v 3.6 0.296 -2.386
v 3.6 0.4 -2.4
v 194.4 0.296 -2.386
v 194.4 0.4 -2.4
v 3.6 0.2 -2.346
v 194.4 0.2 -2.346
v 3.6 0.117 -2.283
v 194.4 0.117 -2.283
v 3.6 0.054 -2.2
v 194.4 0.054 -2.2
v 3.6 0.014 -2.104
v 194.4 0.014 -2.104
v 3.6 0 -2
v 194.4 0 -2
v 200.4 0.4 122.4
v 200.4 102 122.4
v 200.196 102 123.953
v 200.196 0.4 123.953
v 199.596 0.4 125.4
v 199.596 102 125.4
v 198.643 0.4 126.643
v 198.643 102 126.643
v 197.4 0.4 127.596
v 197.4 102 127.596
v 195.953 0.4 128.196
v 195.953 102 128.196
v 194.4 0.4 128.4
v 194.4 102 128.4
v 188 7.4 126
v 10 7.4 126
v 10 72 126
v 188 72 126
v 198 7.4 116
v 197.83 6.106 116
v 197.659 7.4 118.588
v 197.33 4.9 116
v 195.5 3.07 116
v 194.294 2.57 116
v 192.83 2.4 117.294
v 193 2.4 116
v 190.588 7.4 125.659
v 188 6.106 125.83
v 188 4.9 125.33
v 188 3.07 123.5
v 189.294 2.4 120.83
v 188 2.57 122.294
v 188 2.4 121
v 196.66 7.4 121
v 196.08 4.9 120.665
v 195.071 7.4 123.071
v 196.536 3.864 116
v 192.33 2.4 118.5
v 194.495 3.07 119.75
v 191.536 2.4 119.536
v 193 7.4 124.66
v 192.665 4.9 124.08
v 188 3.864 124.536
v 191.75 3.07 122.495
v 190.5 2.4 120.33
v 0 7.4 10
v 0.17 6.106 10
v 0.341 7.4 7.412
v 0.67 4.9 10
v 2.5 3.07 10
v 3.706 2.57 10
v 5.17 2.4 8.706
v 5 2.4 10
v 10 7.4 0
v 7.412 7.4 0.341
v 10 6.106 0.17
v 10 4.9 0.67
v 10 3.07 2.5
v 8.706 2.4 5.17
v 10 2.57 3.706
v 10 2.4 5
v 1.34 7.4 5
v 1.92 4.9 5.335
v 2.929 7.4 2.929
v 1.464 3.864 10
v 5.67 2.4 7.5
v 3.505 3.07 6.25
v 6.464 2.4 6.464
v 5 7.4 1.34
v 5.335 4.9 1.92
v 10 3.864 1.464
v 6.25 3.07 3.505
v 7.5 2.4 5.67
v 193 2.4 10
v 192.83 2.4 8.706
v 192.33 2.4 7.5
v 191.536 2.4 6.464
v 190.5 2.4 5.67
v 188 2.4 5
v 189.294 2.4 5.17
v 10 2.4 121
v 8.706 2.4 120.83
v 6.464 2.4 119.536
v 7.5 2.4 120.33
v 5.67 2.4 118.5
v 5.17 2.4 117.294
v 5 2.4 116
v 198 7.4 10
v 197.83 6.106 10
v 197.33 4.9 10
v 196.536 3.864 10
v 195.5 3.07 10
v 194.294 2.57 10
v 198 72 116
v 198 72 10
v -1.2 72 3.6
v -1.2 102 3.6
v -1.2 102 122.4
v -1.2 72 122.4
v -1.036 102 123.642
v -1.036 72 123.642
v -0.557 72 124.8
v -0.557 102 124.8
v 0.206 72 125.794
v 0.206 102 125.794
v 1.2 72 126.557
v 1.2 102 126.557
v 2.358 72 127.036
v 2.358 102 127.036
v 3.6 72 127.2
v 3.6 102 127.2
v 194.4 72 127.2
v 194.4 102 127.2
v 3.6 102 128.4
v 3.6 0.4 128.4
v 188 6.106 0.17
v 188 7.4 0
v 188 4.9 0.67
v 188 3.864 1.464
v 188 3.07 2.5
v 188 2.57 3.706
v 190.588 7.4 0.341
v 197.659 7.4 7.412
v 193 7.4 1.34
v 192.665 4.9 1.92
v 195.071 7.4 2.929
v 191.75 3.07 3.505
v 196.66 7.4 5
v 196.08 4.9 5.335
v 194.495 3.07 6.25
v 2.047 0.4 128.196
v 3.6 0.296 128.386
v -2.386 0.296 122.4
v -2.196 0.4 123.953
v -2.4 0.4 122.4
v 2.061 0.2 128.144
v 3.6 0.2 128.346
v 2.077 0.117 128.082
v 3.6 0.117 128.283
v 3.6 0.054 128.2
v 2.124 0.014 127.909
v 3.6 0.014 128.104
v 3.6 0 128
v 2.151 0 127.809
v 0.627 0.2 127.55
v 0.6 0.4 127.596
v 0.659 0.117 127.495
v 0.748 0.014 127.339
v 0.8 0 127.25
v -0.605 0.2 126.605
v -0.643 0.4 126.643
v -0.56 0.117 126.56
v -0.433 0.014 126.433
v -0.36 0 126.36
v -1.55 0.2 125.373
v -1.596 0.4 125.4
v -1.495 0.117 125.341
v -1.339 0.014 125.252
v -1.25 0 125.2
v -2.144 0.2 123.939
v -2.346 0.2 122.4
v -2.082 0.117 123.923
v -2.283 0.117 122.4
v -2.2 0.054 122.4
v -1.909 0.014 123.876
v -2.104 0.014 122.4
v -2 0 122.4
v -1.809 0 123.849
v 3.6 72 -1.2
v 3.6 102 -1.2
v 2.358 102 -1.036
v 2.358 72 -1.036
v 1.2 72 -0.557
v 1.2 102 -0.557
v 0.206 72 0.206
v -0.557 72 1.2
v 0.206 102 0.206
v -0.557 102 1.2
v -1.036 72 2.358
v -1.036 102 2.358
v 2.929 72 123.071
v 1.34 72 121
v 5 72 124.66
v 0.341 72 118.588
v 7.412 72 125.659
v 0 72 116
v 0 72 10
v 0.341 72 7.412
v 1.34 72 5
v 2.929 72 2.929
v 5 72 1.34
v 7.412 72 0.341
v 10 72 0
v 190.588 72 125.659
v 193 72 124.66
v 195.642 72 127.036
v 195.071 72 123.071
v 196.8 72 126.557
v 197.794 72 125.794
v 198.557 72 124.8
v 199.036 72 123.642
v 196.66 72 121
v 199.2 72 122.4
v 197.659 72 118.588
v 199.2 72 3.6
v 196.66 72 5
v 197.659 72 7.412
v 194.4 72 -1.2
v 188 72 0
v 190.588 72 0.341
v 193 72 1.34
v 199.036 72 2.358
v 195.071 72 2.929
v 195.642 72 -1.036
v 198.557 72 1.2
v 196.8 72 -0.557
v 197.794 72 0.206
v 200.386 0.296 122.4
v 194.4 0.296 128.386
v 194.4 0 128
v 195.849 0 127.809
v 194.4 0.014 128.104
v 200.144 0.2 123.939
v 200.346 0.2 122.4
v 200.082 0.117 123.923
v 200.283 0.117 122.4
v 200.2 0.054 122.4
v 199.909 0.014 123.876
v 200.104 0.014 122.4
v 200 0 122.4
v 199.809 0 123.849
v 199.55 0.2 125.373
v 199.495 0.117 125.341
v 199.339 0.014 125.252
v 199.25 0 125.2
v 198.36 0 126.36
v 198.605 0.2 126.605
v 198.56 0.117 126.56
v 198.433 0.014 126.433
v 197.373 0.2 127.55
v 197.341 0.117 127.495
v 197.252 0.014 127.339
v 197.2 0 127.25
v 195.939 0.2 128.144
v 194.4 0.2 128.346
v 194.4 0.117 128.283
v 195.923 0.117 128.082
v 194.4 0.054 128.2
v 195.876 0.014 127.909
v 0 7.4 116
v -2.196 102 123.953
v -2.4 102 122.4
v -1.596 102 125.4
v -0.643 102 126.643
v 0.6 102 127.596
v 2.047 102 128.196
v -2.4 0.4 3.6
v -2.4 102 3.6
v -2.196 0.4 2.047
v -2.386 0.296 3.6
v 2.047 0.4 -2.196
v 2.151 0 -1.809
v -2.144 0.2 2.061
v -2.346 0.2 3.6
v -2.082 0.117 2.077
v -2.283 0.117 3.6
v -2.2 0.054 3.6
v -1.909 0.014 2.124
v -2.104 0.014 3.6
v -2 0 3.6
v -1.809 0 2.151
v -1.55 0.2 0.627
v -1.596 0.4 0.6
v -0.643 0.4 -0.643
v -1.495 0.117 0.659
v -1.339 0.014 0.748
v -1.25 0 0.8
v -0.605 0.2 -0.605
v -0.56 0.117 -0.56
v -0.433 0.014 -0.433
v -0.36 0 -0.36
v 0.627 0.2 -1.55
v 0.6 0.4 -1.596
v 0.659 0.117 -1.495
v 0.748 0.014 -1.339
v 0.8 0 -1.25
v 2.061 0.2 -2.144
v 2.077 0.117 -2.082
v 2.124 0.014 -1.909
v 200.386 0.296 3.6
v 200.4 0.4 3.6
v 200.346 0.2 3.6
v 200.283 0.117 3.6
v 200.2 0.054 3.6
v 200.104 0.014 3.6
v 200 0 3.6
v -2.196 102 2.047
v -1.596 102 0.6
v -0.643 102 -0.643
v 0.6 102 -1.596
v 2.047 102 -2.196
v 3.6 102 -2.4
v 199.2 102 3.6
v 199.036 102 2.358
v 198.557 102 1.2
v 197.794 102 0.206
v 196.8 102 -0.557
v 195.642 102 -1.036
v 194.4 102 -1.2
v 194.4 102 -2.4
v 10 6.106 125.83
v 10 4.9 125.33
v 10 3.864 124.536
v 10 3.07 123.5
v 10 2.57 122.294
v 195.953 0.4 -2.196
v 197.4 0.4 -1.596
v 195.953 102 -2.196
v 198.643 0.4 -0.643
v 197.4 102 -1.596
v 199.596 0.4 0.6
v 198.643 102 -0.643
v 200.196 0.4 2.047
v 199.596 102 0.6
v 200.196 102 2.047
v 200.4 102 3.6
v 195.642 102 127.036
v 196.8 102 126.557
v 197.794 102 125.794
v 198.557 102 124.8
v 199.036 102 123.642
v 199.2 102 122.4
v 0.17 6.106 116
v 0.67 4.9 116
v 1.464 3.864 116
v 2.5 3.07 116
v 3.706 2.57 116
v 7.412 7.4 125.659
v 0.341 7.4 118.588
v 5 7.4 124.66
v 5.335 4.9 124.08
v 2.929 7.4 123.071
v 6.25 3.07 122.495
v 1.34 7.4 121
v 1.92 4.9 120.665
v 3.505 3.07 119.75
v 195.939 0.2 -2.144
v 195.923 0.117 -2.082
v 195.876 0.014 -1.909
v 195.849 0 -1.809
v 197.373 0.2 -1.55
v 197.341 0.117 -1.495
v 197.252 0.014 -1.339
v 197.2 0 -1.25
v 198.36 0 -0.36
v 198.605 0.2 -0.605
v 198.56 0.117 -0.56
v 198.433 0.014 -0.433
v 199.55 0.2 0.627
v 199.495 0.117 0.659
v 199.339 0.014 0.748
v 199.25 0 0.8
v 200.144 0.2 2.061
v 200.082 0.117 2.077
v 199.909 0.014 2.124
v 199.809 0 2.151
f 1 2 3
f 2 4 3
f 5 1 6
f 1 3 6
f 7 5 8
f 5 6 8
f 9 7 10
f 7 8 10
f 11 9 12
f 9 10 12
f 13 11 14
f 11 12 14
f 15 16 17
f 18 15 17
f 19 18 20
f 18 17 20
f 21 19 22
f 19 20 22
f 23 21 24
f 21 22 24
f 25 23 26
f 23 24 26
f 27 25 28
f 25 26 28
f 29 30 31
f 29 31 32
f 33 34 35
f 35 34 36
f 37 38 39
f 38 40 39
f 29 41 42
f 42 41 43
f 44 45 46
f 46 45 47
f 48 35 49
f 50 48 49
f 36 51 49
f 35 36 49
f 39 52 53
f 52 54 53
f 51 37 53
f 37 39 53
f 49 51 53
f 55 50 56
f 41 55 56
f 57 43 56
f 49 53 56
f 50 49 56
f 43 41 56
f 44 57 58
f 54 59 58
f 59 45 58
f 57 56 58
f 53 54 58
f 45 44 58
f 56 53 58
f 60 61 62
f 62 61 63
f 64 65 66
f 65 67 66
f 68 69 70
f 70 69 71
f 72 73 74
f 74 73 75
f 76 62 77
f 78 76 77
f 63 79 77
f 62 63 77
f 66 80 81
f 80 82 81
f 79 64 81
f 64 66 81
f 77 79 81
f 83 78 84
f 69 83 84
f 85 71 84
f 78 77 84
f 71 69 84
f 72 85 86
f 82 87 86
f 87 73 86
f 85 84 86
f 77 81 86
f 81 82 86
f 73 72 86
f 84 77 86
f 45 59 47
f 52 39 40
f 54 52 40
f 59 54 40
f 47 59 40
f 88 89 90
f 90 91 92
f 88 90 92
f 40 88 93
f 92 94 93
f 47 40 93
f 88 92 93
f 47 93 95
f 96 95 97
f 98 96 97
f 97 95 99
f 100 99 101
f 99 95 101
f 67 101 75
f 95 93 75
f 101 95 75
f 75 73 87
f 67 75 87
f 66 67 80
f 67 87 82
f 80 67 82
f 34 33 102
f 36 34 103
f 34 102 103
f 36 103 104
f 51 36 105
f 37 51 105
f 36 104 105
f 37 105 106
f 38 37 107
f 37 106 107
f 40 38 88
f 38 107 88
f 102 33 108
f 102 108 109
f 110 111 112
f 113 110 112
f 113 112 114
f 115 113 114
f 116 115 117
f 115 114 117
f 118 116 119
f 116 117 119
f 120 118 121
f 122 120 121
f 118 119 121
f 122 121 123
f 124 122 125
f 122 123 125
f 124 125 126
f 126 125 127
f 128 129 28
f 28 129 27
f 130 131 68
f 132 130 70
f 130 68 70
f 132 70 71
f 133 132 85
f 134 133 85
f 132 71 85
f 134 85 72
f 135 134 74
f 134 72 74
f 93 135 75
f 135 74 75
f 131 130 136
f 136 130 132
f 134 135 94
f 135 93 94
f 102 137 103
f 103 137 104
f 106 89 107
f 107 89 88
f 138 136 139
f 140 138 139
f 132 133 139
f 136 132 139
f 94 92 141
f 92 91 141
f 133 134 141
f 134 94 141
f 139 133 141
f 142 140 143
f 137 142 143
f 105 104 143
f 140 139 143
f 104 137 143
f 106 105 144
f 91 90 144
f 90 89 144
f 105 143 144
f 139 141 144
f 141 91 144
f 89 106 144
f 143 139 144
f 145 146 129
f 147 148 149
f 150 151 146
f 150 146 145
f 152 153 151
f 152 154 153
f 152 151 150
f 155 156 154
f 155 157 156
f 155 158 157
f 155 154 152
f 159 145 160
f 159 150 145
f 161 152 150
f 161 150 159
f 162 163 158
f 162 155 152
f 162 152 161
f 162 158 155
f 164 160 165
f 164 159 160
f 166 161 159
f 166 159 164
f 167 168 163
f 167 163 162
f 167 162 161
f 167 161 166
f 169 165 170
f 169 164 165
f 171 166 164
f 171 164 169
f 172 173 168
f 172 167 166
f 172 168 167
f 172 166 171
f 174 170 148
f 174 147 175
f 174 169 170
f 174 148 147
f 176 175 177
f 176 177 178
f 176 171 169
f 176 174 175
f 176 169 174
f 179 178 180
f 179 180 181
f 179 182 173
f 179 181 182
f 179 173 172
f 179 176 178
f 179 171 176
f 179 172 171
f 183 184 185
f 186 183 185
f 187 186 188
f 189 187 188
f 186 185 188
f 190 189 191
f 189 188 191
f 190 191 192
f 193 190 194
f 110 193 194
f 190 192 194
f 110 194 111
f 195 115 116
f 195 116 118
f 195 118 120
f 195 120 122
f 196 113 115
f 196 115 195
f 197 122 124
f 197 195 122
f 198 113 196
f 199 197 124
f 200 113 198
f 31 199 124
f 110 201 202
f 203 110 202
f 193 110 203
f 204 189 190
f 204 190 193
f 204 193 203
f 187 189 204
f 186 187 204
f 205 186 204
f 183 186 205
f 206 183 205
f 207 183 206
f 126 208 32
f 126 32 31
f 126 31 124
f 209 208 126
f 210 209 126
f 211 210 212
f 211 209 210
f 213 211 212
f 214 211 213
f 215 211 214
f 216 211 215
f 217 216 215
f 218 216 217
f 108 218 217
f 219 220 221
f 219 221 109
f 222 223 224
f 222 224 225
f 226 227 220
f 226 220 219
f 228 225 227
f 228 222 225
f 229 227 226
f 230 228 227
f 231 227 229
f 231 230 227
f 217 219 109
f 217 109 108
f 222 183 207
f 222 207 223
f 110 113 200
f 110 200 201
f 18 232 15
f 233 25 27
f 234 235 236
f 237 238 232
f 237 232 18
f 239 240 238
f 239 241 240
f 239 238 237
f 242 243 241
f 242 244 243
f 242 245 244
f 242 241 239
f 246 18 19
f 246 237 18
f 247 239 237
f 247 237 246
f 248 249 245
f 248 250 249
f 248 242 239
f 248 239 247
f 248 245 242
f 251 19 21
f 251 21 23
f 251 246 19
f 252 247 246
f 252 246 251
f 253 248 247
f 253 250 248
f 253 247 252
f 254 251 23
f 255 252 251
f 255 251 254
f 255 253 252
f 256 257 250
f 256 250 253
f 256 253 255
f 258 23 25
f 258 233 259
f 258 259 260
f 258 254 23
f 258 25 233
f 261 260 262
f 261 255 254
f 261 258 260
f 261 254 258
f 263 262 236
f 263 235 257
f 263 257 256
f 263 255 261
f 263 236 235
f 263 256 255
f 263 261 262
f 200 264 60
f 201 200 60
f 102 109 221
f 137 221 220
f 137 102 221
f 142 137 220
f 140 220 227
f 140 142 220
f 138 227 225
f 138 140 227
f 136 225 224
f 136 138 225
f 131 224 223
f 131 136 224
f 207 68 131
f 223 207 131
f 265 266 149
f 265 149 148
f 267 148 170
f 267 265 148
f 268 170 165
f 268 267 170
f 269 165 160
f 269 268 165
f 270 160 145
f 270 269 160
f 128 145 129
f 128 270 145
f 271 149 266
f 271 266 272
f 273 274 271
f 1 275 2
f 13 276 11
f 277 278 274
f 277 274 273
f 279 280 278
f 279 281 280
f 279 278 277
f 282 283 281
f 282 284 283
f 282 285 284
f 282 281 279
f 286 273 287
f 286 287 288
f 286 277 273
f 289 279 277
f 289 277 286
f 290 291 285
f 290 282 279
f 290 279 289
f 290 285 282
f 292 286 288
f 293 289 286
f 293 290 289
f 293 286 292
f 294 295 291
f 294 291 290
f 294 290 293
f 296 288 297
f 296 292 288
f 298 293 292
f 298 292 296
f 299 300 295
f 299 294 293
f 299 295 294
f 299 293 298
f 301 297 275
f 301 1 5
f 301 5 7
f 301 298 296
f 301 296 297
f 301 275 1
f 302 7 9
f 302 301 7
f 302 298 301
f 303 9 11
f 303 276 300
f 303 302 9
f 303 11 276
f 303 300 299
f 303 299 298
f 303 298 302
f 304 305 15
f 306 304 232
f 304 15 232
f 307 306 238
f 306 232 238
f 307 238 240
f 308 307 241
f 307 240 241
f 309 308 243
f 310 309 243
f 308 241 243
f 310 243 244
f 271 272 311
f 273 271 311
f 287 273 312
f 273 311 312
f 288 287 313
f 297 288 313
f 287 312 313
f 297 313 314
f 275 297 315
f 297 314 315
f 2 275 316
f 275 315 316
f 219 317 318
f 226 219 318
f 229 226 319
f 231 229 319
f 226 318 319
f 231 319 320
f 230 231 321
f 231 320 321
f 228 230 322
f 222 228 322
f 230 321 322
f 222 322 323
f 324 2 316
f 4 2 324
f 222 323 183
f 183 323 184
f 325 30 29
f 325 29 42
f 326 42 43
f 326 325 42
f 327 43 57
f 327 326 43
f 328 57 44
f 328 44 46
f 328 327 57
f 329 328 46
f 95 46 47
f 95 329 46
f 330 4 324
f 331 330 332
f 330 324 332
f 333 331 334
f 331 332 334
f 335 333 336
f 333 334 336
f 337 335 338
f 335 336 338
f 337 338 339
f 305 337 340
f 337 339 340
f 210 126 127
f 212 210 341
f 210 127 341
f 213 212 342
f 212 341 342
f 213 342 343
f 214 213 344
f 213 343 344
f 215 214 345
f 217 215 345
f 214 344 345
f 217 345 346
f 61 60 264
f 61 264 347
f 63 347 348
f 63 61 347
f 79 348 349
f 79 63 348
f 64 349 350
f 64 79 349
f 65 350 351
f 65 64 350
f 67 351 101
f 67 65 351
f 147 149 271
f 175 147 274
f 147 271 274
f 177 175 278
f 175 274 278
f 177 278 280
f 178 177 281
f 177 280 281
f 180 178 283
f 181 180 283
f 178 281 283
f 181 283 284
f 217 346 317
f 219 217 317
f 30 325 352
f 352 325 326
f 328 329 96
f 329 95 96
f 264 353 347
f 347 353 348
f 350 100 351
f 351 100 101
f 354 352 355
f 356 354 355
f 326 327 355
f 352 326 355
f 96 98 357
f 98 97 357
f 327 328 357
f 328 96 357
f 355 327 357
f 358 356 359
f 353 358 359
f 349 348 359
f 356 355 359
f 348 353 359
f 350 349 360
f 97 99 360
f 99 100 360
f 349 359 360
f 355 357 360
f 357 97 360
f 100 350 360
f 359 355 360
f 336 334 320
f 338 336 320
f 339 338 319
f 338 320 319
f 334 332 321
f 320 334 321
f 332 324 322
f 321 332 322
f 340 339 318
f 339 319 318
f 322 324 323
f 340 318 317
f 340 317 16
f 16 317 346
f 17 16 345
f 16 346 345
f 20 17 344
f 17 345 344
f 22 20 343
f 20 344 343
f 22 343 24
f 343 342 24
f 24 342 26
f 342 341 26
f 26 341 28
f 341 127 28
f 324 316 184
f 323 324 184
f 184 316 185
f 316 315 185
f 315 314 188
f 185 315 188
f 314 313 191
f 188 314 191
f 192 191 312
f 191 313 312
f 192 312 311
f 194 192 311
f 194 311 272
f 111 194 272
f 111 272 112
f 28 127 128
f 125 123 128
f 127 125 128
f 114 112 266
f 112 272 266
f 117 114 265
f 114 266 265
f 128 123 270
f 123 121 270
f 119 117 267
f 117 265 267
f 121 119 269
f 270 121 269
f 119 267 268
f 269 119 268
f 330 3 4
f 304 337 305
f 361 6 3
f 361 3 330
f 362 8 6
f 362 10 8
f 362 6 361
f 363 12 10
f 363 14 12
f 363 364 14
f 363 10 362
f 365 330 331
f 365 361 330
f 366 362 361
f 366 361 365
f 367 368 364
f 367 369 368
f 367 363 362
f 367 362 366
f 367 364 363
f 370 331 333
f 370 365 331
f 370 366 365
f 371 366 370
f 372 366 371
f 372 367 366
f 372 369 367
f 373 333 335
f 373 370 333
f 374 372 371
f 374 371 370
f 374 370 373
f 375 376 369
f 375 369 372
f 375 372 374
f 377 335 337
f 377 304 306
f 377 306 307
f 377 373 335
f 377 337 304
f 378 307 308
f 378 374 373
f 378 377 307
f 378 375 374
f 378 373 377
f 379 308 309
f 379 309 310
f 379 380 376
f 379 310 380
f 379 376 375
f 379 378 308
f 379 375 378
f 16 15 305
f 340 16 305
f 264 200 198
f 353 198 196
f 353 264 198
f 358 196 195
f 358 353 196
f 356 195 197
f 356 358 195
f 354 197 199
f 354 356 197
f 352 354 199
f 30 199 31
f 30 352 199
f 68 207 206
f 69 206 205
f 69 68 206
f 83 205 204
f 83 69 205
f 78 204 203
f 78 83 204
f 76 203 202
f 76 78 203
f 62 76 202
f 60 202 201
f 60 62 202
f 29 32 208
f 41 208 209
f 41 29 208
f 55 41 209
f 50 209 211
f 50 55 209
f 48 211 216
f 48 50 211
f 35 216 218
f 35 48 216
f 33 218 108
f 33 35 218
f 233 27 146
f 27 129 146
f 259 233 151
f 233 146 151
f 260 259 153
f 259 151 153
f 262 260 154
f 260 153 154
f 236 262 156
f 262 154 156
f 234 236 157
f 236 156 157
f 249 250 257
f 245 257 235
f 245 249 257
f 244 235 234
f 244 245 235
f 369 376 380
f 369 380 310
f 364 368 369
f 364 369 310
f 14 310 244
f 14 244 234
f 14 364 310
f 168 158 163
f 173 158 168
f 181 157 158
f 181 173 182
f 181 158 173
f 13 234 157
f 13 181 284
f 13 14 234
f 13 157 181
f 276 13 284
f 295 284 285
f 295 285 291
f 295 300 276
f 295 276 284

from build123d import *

# Parameters (mm, degrees)
SKETCH1_W           = 202.8
SKETCH1_H           = 130.8
SKETCH1_W_2         = 198
SKETCH1_H_2         = 126
BOSS_EXTRUDE1_DEPTH = 102
SKETCH3_W           = 198
SKETCH3_H           = 126
BOSS_EXTRUDE3_DEPTH = 2.4
FILLET1_R           = 5
FILLET4_R           = 10
FILLET2_R           = 6
FILLET3_R           = 0.4
CUT_EXTRUDE1_DEPTH  = 30


with BuildPart() as part:
    # Sketch1 → Boss-Extrude1 (new body)
    with BuildSketch(Plane(origin=(0, 0, 0), x_dir=(1, 0, 0), z_dir=(0, 1, 0))):
        with Locations((99, -63)):
            Rectangle(SKETCH1_W, SKETCH1_H)
        with Locations((99, -63)):
            Rectangle(SKETCH1_W_2, SKETCH1_H_2, mode=Mode.SUBTRACT)
    extrude(amount=BOSS_EXTRUDE1_DEPTH)

    # Sketch3 → Boss-Extrude3 (add)
    with BuildSketch(Plane(origin=(0, 0, 0), x_dir=(-1, 0, 0), z_dir=(0, -1, 0))):
        with Locations((-99, -63)):
            Rectangle(SKETCH3_W, SKETCH3_H)
    extrude(amount=-BOSS_EXTRUDE3_DEPTH)

    # Fillet1
    fillet1_edges = [part.edges().sort_by_distance(p)[0] for p in [
        (0, 2.4, 63),
        (99, 2.4, 126),
        (198, 2.4, 63),
        (99, 2.4, 0),
    ]]
    fillet(fillet1_edges, radius=FILLET1_R)

    # Fillet4
    # the kernel refuses this fillet: 10 mm, written as the material it adds along each edge
    with BuildSketch(Plane(origin=(10, 2.4, 10), x_dir=(-1, 0, 0), z_dir=(0, 0, 1))) as fillet4_piece_1:
        with BuildLine():
            CenterArc((5, -5), 5, 0, 90)
            Line((10, -5), (10, 0))
            Line((10, 0), (5, 0))
        make_face()
    revolve(axis=Axis((10, 2.4, 10), (0, -1, 0)), revolution_arc=90)
    with BuildSketch(Plane(origin=(10, 2.4, 116), x_dir=(0, 0, 1), z_dir=(1, 0, 0))) as fillet4_piece_2:
        with BuildLine():
            CenterArc((5, -5), 5, 0, 90)
            Line((10, -5), (10, 0))
            Line((10, 0), (5, 0))
        make_face()
    revolve(axis=Axis((10, 2.4, 116), (0, -1, 0)), revolution_arc=90)
    with BuildSketch(Plane(origin=(188, 2.4, 10), x_dir=(0, 0, -1), z_dir=(-1, 0, 0))) as fillet4_piece_3:
        with BuildLine():
            CenterArc((5, -5), 5, 0, 90)
            Line((10, -5), (10, 0))
            Line((10, 0), (5, 0))
        make_face()
    revolve(axis=Axis((188, 2.4, 10), (0, -1, 0)), revolution_arc=90)
    with BuildSketch(Plane(origin=(188, 2.4, 116), x_dir=(1, 0, 0), z_dir=(0, 0, -1))) as fillet4_piece_4:
        with BuildLine():
            CenterArc((5, -5), 5, 0, 90)
            Line((10, -5), (10, 0))
            Line((10, 0), (5, 0))
        make_face()
    revolve(axis=Axis((188, 2.4, 116), (0, -1, 0)), revolution_arc=90)
    with BuildSketch(Plane(origin=(0, 2.4, 0), x_dir=(1, 0, 0), z_dir=(0, 1, 0)), Plane(origin=(0, 2.4, 126), x_dir=(0, 0, -1), z_dir=(0, 1, 0))) as fillet4_piece_5:
        with BuildLine():
            CenterArc((FILLET4_R, -FILLET4_R), FILLET4_R, 90, 90)
            Line((0, -FILLET4_R), (0, 0))
            Line((0, 0), (FILLET4_R, 0))
        make_face()
    extrude(amount=99.6)
    with BuildSketch(Plane(origin=(198, 2.4, 126), x_dir=(0, 0, -1), z_dir=(0, 1, 0)), Plane(origin=(198, 2.4, 0), x_dir=(-1, 0, 0), z_dir=(0, 1, 0))) as fillet4_piece_6:
        with BuildLine():
            CenterArc((FILLET4_R, FILLET4_R), FILLET4_R, 180, 90)
            Line((0, FILLET4_R), (0, 0))
            Line((0, 0), (FILLET4_R, 0))
        make_face()
    extrude(amount=99.6)

    # Fillet2
    fillet2_edges = [part.edges().sort_by_distance(p)[0] for p in [
        (200.4, 51, -2.4),
        (200.4, 51, 128.4),
        (-2.4, 51, 128.4),
        (-2.4, 51, -2.4),
    ]]
    fillet(fillet2_edges, radius=FILLET2_R)

    # Fillet3
    fillet3_edges = [part.edges().sort_by_distance(p)[0] for p in [
        (99, 0, -2.4),
        (200.4, 0, 63),
        (-2.4, 0, 63),
        (198.642640687, 0, 126.642640687),
        (198.642640687, 0, -0.642640687),
        (-0.642640687, 0, -0.642640687),
        (-0.642640687, 0, 126.642640687),
        (99, 0, 128.4),
    ]]
    fillet(fillet3_edges, radius=FILLET3_R)

    # Sketch7 → Cut-Extrude1 (cut)
    with BuildSketch(Plane(origin=(0, 102, 0), x_dir=(1, 0, 0), z_dir=(0, 1, 0))):
        with BuildLine():
            Line((3.6, -127.2), (194.4, -127.2))
            ThreePointArc((194.4, -127.2), (197.79411255, -125.79411255), (199.2, -122.4))
            Line((199.2, -122.4), (199.2, -3.6))
            ThreePointArc((199.2, -3.6), (197.79411255, -0.20588745), (194.4, 1.2))
            Line((194.4, 1.2), (3.6, 1.2))
            ThreePointArc((3.6, 1.2), (0.20588745, -0.20588745), (-1.2, -3.6))
            Line((-1.2, -3.6), (-1.2, -122.4))
            ThreePointArc((-1.2, -122.4), (0.20588745, -125.79411255), (3.6, -127.2))
        make_face()
    extrude(amount=-CUT_EXTRUDE1_DEPTH, mode=Mode.SUBTRACT)


solid = part.part
